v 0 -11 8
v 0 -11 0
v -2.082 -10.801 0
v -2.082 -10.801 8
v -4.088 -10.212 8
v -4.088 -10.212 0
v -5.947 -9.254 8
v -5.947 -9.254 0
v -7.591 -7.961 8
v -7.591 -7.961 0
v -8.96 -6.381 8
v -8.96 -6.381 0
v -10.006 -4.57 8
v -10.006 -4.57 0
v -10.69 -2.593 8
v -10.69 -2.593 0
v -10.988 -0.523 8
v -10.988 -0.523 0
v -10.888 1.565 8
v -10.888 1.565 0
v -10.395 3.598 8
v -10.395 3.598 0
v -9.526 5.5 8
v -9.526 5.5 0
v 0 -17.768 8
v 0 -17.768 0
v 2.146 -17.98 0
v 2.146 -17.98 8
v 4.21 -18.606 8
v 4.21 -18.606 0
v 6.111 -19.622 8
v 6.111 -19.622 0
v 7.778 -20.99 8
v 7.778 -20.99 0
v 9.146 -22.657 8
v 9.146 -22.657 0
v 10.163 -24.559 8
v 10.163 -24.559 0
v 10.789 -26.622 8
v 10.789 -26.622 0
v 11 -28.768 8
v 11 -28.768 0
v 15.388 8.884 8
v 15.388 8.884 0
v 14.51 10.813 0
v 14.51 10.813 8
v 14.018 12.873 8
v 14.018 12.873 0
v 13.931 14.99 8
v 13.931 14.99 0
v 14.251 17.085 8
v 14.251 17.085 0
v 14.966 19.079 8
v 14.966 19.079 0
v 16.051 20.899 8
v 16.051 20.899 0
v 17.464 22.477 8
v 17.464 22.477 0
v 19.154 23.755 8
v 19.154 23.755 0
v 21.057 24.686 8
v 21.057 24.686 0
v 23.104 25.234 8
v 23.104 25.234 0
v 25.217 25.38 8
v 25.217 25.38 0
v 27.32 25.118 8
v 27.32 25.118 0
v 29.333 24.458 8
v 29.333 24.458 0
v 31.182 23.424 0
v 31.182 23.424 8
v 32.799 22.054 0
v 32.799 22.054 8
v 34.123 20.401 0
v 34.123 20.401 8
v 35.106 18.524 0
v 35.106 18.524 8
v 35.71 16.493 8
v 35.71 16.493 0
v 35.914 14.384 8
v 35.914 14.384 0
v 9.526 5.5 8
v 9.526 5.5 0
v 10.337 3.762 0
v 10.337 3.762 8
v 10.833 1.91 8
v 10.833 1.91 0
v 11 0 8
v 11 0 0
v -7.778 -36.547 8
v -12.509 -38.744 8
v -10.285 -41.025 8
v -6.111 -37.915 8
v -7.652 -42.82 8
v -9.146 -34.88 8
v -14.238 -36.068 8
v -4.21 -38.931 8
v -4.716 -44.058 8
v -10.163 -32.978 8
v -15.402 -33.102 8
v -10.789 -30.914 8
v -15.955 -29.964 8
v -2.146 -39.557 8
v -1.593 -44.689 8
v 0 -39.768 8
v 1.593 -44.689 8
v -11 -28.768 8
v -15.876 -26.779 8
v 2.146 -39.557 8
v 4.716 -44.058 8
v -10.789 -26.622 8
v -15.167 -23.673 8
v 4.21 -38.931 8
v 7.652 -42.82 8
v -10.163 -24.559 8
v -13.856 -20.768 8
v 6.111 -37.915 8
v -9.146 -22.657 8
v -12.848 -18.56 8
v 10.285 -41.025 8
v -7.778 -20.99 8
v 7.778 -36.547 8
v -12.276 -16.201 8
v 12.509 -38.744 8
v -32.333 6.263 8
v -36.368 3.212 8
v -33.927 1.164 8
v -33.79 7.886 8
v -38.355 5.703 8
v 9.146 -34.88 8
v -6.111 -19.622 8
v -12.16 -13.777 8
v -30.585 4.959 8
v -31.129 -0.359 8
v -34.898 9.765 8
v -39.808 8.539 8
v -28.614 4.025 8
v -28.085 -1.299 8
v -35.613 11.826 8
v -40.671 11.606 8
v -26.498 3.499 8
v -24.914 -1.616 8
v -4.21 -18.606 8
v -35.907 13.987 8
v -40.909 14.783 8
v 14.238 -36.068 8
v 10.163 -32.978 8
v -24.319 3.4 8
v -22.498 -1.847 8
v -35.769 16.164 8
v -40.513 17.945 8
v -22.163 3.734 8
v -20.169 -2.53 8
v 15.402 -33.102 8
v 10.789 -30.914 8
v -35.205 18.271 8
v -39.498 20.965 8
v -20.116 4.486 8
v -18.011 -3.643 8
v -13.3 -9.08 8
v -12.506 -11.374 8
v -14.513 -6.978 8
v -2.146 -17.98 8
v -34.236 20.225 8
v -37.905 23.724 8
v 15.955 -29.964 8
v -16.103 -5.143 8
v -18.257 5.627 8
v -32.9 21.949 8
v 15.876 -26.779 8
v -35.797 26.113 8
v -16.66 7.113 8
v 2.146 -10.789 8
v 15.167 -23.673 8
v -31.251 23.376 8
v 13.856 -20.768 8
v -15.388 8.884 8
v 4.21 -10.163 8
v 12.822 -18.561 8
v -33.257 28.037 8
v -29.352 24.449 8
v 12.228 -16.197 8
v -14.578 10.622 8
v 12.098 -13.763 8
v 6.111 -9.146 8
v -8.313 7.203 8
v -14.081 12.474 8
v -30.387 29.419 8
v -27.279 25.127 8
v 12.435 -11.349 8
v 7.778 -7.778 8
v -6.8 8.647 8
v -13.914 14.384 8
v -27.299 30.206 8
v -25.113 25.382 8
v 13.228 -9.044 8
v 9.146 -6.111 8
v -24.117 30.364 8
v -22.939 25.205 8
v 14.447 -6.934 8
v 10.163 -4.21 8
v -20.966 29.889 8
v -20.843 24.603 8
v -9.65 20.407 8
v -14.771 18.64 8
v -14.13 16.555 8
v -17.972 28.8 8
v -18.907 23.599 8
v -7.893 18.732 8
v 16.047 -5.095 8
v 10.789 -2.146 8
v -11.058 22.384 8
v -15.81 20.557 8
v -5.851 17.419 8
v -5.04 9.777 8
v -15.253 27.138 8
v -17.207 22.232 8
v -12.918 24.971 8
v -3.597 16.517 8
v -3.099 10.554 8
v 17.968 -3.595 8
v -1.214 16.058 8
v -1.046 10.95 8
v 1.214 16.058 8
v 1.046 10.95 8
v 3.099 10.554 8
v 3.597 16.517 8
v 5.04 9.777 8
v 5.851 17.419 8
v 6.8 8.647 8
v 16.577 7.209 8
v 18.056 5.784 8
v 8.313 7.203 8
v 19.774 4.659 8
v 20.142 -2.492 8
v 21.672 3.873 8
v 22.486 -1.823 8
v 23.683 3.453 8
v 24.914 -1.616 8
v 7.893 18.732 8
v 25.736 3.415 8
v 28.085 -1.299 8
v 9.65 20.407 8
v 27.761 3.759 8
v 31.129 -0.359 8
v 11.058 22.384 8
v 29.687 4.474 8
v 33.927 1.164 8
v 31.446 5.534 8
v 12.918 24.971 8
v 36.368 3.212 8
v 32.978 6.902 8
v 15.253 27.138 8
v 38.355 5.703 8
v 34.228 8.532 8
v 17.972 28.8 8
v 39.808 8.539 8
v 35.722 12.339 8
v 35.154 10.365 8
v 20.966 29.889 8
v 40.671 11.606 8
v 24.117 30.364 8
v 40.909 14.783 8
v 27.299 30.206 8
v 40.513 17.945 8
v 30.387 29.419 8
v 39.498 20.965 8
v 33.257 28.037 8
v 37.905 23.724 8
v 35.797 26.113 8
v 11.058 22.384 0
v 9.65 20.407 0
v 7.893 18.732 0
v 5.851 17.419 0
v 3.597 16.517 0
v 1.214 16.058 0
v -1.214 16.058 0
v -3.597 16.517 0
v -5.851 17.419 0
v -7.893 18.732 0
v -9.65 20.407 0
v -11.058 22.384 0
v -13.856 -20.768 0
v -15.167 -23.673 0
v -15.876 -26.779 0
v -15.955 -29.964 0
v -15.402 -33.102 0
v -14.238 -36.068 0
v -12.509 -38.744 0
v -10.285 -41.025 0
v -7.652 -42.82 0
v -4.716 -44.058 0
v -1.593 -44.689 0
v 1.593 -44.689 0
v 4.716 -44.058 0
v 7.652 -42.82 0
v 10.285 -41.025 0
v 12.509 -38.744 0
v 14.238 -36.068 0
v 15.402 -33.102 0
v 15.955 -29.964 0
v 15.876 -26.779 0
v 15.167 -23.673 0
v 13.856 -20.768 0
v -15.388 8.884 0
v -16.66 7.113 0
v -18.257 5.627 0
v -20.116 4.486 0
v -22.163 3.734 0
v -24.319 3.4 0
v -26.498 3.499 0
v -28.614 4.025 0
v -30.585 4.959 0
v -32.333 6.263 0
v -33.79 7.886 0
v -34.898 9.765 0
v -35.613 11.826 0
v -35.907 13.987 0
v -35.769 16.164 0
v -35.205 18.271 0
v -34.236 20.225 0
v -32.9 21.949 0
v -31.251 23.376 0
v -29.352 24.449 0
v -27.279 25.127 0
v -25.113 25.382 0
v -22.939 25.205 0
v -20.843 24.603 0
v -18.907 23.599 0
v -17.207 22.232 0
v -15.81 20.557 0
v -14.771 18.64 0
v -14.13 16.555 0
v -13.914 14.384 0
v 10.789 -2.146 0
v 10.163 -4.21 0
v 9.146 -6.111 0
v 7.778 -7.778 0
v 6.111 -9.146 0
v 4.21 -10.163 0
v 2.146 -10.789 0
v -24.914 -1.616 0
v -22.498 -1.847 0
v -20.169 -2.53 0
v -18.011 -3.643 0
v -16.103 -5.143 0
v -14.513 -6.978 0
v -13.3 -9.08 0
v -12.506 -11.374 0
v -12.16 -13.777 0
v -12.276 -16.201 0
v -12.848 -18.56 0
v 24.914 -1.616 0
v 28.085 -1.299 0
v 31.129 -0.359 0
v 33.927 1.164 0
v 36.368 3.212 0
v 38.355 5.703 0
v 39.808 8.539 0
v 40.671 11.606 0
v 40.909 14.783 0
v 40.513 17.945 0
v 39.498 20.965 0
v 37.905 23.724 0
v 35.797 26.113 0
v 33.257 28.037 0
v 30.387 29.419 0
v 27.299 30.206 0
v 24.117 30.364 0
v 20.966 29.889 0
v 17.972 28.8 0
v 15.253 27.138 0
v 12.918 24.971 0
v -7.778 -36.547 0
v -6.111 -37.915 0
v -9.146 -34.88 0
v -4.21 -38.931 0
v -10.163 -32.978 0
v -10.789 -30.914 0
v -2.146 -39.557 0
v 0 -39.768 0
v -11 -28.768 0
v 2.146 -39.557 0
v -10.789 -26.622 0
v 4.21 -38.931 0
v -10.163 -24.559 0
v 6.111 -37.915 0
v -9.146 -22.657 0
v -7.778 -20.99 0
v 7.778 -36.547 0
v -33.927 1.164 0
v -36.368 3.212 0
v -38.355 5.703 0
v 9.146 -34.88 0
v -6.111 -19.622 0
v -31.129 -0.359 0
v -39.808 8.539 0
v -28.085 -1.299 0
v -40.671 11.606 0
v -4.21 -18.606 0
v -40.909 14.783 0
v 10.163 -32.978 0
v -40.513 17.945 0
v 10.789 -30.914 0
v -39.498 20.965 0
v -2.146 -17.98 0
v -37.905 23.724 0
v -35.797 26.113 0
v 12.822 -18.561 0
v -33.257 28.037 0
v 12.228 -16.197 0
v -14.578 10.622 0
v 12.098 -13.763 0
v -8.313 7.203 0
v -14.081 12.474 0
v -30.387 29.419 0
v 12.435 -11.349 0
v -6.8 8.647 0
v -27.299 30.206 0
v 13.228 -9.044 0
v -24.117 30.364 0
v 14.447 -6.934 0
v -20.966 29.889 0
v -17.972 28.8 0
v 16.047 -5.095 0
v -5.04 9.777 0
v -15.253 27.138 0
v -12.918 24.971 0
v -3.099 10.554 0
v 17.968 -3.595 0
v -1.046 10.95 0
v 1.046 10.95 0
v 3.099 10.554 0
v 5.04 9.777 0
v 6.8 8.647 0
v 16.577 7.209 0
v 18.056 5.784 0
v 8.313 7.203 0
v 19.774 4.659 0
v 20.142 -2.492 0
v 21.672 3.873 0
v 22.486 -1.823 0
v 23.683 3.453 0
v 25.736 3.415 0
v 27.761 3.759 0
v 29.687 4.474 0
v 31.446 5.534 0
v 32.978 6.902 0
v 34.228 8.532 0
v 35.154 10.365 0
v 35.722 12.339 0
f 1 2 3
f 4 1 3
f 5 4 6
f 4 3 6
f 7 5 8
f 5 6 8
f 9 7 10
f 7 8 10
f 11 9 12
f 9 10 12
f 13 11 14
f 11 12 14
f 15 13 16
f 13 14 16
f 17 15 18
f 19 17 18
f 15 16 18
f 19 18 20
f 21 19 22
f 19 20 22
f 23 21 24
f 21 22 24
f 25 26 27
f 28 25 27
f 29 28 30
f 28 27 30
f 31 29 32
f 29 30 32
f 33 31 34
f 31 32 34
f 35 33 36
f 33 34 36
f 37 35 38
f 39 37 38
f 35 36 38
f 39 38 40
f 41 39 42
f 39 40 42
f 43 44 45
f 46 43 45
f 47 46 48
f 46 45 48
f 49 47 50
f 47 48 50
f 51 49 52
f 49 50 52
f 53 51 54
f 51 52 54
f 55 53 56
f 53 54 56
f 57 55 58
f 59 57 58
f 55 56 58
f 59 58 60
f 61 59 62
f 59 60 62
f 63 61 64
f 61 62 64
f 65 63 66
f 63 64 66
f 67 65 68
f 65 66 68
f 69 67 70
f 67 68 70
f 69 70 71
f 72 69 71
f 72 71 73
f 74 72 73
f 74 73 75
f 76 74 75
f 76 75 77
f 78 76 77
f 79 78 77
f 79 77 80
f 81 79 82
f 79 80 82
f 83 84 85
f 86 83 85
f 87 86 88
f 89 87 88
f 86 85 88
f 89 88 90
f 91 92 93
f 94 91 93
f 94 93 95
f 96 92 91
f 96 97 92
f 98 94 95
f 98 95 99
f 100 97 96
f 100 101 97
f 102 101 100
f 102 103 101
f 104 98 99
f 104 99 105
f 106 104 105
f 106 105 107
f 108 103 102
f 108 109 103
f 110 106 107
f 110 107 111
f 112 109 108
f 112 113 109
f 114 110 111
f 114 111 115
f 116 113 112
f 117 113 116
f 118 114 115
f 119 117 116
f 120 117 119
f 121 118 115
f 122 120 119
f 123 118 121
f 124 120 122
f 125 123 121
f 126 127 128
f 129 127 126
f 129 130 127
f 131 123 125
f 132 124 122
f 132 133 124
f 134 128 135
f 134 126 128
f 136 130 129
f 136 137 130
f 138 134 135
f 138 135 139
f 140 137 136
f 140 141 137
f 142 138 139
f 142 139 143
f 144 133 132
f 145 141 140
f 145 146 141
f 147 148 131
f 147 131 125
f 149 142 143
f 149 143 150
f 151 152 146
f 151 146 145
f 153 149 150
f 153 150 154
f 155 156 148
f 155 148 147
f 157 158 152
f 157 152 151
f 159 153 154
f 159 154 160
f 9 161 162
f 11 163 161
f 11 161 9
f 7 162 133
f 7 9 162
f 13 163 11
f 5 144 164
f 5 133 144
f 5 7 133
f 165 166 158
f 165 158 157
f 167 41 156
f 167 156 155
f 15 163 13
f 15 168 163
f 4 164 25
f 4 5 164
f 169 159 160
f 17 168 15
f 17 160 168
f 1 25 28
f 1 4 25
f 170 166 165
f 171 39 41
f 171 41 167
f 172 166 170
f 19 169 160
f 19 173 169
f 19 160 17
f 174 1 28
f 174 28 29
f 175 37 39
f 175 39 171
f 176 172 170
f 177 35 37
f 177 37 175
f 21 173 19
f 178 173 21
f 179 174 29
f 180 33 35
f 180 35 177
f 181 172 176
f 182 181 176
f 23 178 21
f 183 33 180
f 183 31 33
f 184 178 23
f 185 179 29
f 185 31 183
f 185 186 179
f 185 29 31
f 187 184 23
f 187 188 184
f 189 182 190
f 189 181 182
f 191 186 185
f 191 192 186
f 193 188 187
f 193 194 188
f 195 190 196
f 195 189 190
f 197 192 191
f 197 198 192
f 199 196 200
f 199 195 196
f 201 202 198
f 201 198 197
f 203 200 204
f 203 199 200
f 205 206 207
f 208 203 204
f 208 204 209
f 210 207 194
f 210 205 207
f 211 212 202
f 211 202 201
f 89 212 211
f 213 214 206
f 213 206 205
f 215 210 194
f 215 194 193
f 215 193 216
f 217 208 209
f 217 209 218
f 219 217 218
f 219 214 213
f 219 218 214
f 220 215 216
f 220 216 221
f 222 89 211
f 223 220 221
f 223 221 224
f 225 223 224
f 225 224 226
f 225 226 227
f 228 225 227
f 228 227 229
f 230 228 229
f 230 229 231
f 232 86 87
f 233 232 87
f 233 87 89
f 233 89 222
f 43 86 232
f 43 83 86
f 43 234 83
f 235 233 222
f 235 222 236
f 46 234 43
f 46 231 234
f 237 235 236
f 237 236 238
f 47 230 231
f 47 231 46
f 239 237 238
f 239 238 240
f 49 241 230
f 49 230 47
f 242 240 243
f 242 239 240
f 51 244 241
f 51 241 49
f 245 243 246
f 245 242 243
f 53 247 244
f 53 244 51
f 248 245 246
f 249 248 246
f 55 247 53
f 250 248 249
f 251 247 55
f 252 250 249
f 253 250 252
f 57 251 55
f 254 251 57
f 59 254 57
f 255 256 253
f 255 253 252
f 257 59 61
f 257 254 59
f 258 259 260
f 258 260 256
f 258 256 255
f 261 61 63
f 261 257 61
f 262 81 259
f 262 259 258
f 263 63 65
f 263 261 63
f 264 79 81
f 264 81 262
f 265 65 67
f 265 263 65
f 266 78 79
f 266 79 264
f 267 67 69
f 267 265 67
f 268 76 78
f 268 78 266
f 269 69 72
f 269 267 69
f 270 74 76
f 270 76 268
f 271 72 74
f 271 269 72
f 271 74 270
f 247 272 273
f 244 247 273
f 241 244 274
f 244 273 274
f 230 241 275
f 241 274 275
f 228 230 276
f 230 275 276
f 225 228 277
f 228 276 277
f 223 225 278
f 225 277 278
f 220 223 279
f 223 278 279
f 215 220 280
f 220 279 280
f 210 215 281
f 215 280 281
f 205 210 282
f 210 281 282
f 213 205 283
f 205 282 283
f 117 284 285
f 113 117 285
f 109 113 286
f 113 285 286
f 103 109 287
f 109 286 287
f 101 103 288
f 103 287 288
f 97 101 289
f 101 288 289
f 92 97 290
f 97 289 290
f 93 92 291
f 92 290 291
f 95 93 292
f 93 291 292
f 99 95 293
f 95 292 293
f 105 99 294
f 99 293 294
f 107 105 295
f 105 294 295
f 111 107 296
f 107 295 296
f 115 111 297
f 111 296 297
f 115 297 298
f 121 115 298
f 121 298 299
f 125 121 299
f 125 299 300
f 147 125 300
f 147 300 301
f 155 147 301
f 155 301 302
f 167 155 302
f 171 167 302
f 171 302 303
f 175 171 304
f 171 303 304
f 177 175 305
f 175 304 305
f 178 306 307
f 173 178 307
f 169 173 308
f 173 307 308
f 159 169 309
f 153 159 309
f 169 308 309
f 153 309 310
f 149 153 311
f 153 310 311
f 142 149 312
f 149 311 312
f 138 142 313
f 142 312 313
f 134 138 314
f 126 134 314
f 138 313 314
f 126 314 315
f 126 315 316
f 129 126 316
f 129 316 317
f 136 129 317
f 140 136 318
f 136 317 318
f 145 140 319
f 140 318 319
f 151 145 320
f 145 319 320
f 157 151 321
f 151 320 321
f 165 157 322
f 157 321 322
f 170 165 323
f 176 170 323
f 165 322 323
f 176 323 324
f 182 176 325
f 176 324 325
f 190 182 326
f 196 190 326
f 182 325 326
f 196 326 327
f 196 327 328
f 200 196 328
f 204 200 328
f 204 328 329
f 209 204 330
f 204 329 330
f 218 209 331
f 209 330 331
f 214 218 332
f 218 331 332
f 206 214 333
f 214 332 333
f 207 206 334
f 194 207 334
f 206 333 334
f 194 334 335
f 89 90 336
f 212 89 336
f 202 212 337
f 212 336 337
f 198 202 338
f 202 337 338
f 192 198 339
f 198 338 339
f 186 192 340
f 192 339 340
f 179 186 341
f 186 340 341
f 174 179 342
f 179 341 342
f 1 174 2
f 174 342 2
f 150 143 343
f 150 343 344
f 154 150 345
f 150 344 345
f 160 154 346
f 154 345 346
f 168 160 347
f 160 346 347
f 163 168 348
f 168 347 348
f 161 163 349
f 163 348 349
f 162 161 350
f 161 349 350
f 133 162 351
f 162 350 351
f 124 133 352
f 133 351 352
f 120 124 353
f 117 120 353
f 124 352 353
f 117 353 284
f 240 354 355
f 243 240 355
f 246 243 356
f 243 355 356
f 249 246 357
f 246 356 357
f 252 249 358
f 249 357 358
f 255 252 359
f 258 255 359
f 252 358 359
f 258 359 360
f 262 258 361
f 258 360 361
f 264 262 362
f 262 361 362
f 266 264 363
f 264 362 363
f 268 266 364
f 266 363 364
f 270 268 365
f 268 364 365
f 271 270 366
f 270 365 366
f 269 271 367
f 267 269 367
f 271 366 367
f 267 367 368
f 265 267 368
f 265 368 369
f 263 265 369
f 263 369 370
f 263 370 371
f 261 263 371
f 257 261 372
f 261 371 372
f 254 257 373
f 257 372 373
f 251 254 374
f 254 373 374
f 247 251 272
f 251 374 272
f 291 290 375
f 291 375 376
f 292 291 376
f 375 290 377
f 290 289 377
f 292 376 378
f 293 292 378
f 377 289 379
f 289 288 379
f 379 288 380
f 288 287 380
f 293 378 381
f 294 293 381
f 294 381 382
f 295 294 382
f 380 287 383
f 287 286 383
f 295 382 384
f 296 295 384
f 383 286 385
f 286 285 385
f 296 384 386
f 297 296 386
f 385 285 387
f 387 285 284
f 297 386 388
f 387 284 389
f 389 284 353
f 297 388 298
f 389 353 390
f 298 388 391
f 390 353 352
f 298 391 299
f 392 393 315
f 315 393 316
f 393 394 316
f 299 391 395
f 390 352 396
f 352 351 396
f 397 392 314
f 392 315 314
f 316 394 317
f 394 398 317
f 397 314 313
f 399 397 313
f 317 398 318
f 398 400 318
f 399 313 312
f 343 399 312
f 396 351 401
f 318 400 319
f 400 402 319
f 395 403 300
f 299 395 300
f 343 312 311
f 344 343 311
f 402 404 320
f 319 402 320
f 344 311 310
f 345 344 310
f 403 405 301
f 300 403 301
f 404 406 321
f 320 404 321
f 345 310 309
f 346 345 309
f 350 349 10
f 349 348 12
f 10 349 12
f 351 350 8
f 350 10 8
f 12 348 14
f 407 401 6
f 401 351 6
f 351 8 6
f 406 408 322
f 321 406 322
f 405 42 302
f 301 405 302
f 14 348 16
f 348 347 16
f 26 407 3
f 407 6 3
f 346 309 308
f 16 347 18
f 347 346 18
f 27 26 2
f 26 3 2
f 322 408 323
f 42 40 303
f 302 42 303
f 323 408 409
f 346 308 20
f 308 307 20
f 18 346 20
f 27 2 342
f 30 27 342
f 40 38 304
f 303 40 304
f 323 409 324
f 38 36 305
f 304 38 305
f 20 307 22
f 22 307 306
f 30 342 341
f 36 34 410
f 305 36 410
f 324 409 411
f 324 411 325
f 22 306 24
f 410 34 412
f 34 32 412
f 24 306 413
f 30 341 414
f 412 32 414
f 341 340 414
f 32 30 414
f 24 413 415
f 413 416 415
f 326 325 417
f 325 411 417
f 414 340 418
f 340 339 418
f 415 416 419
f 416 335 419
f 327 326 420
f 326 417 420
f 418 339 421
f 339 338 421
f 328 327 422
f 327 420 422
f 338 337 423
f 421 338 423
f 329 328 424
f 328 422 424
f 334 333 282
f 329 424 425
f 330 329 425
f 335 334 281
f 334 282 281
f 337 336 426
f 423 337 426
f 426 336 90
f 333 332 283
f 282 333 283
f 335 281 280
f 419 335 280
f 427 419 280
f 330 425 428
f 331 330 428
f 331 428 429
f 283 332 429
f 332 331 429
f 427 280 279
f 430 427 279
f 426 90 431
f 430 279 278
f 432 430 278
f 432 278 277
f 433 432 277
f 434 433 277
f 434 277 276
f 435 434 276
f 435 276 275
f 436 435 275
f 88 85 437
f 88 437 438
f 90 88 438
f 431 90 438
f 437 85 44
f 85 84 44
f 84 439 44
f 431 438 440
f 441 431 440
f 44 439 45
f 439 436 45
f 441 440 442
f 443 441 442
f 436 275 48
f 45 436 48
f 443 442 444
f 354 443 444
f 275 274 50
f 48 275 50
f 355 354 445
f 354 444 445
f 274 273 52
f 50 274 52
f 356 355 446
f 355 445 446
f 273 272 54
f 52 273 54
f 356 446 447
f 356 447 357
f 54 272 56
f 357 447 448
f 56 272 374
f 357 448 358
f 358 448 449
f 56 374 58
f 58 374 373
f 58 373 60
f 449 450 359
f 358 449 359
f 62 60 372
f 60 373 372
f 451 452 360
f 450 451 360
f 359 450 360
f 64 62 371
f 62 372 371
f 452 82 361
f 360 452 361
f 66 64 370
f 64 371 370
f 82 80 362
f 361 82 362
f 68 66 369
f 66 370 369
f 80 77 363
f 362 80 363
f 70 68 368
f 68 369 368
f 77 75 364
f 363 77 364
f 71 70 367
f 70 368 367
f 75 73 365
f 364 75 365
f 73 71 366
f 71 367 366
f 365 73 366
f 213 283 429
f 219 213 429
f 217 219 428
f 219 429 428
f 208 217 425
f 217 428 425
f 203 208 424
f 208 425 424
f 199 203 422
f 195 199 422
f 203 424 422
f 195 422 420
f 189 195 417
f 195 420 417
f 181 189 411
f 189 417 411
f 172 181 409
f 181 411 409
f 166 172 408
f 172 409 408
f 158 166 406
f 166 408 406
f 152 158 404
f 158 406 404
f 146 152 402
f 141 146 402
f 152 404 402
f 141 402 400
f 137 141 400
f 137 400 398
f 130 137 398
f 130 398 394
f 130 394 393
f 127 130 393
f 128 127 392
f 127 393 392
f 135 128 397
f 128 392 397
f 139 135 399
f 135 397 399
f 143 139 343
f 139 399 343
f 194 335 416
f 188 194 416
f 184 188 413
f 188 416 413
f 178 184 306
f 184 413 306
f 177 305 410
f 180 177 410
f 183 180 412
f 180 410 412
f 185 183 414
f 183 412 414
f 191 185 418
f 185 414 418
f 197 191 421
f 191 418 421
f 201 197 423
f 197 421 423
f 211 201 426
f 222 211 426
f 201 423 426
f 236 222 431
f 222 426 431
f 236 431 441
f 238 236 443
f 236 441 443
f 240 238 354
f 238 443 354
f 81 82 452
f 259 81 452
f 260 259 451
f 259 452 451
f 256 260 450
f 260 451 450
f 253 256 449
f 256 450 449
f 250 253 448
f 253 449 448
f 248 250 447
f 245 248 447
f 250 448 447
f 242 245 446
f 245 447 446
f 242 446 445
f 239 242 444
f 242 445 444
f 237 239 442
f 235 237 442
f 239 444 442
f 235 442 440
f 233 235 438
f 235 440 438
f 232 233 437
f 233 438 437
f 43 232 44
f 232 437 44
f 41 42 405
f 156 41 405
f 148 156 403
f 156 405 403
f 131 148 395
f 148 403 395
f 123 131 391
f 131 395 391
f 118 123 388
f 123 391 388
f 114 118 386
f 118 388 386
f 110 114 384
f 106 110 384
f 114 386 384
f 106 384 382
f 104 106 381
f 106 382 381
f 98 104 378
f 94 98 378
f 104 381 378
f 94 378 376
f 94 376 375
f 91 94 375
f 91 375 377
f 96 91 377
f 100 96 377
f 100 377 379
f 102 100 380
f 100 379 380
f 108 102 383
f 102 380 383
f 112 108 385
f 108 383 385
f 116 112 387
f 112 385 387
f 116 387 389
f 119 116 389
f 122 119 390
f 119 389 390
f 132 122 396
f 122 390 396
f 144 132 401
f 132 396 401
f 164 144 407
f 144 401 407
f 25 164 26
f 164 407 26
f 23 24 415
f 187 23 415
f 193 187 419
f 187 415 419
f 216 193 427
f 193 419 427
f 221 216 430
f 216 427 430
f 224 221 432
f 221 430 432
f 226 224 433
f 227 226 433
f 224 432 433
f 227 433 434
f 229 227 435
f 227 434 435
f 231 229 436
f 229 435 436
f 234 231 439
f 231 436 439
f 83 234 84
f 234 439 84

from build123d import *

# Parameters (mm, degrees)
F1_DEPTH = 8


with BuildPart() as f1:
    # F0 (on Top) → F1 (new body)
    with BuildSketch(Plane.XY):
        with BuildLine():
            ThreePointArc((11, -28.76845), (7.778175, -20.990275), (0, -17.76845))
            ThreePointArc((0, -17.76845), (-7.778175, -36.546625), (11, -28.76845))
        make_face()
        with BuildLine():
            ThreePointArc((-13.914208, 14.384225), (-35.539393, 17.231234), (-15.387929, 8.884225))
            ThreePointArc((-15.387929, 8.884225), (-14.289024, 11.537215), (-13.914208, 14.384225))
        make_face()
        with BuildLine():
            ThreePointArc((35.914208, 14.384225), (22.067199, 25.009409), (15.387929, 8.884225))
            ThreePointArc((15.387929, 8.884225), (27.761218, 3.759041), (35.914208, 14.384225))
        make_face()
        with BuildLine():
            ThreePointArc((24.914208, -1.615775), (38.770615, 22.384225), (11.057802, 22.384225))
            ThreePointArc((11.057802, 22.384225), (0, 16), (-11.057802, 22.384225))
            ThreePointArc((-11.057802, 22.384225), (-38.770615, 22.384225), (-24.914208, -1.615775))
            ThreePointArc((-24.914208, -1.615775), (-13.856406, -8), (-13.856406, -20.76845))
            ThreePointArc((-13.856406, -20.76845), (0, -44.76845), (13.856406, -20.76845))
            ThreePointArc((13.856406, -20.76845), (13.786503, -7.959641), (24.914208, -1.615775))
        make_face()
        with BuildLine():
            ThreePointArc((11, -28.76845), (-7.778175, -36.546625), (0, -17.76845))
            ThreePointArc((0, -17.76845), (7.778175, -20.990275), (11, -28.76845))
        make_face(mode=Mode.SUBTRACT)
        with BuildLine():
            ThreePointArc((-13.914208, 14.384225), (-14.289024, 11.537215), (-15.387929, 8.884225))
            ThreePointArc((-15.387929, 8.884225), (-35.539393, 17.231234), (-13.914208, 14.384225))
        make_face(mode=Mode.SUBTRACT)
        with BuildLine():
            ThreePointArc((11, 0), (7.778175, -7.778175), (0, -11))
            ThreePointArc((0, -11), (-9.526279, -5.5), (-9.526279, 5.5))
            ThreePointArc((-9.526279, 5.5), (0, 11), (9.526279, 5.5))
            ThreePointArc((9.526279, 5.5), (10.625184, 2.847009), (11, 0))
        make_face(mode=Mode.SUBTRACT)
        with BuildLine():
            ThreePointArc((35.914208, 14.384225), (27.761218, 3.759041), (15.387929, 8.884225))
            ThreePointArc((15.387929, 8.884225), (22.067199, 25.009409), (35.914208, 14.384225))
        make_face(mode=Mode.SUBTRACT)
    extrude(amount=F1_DEPTH)


solid = f1.part
